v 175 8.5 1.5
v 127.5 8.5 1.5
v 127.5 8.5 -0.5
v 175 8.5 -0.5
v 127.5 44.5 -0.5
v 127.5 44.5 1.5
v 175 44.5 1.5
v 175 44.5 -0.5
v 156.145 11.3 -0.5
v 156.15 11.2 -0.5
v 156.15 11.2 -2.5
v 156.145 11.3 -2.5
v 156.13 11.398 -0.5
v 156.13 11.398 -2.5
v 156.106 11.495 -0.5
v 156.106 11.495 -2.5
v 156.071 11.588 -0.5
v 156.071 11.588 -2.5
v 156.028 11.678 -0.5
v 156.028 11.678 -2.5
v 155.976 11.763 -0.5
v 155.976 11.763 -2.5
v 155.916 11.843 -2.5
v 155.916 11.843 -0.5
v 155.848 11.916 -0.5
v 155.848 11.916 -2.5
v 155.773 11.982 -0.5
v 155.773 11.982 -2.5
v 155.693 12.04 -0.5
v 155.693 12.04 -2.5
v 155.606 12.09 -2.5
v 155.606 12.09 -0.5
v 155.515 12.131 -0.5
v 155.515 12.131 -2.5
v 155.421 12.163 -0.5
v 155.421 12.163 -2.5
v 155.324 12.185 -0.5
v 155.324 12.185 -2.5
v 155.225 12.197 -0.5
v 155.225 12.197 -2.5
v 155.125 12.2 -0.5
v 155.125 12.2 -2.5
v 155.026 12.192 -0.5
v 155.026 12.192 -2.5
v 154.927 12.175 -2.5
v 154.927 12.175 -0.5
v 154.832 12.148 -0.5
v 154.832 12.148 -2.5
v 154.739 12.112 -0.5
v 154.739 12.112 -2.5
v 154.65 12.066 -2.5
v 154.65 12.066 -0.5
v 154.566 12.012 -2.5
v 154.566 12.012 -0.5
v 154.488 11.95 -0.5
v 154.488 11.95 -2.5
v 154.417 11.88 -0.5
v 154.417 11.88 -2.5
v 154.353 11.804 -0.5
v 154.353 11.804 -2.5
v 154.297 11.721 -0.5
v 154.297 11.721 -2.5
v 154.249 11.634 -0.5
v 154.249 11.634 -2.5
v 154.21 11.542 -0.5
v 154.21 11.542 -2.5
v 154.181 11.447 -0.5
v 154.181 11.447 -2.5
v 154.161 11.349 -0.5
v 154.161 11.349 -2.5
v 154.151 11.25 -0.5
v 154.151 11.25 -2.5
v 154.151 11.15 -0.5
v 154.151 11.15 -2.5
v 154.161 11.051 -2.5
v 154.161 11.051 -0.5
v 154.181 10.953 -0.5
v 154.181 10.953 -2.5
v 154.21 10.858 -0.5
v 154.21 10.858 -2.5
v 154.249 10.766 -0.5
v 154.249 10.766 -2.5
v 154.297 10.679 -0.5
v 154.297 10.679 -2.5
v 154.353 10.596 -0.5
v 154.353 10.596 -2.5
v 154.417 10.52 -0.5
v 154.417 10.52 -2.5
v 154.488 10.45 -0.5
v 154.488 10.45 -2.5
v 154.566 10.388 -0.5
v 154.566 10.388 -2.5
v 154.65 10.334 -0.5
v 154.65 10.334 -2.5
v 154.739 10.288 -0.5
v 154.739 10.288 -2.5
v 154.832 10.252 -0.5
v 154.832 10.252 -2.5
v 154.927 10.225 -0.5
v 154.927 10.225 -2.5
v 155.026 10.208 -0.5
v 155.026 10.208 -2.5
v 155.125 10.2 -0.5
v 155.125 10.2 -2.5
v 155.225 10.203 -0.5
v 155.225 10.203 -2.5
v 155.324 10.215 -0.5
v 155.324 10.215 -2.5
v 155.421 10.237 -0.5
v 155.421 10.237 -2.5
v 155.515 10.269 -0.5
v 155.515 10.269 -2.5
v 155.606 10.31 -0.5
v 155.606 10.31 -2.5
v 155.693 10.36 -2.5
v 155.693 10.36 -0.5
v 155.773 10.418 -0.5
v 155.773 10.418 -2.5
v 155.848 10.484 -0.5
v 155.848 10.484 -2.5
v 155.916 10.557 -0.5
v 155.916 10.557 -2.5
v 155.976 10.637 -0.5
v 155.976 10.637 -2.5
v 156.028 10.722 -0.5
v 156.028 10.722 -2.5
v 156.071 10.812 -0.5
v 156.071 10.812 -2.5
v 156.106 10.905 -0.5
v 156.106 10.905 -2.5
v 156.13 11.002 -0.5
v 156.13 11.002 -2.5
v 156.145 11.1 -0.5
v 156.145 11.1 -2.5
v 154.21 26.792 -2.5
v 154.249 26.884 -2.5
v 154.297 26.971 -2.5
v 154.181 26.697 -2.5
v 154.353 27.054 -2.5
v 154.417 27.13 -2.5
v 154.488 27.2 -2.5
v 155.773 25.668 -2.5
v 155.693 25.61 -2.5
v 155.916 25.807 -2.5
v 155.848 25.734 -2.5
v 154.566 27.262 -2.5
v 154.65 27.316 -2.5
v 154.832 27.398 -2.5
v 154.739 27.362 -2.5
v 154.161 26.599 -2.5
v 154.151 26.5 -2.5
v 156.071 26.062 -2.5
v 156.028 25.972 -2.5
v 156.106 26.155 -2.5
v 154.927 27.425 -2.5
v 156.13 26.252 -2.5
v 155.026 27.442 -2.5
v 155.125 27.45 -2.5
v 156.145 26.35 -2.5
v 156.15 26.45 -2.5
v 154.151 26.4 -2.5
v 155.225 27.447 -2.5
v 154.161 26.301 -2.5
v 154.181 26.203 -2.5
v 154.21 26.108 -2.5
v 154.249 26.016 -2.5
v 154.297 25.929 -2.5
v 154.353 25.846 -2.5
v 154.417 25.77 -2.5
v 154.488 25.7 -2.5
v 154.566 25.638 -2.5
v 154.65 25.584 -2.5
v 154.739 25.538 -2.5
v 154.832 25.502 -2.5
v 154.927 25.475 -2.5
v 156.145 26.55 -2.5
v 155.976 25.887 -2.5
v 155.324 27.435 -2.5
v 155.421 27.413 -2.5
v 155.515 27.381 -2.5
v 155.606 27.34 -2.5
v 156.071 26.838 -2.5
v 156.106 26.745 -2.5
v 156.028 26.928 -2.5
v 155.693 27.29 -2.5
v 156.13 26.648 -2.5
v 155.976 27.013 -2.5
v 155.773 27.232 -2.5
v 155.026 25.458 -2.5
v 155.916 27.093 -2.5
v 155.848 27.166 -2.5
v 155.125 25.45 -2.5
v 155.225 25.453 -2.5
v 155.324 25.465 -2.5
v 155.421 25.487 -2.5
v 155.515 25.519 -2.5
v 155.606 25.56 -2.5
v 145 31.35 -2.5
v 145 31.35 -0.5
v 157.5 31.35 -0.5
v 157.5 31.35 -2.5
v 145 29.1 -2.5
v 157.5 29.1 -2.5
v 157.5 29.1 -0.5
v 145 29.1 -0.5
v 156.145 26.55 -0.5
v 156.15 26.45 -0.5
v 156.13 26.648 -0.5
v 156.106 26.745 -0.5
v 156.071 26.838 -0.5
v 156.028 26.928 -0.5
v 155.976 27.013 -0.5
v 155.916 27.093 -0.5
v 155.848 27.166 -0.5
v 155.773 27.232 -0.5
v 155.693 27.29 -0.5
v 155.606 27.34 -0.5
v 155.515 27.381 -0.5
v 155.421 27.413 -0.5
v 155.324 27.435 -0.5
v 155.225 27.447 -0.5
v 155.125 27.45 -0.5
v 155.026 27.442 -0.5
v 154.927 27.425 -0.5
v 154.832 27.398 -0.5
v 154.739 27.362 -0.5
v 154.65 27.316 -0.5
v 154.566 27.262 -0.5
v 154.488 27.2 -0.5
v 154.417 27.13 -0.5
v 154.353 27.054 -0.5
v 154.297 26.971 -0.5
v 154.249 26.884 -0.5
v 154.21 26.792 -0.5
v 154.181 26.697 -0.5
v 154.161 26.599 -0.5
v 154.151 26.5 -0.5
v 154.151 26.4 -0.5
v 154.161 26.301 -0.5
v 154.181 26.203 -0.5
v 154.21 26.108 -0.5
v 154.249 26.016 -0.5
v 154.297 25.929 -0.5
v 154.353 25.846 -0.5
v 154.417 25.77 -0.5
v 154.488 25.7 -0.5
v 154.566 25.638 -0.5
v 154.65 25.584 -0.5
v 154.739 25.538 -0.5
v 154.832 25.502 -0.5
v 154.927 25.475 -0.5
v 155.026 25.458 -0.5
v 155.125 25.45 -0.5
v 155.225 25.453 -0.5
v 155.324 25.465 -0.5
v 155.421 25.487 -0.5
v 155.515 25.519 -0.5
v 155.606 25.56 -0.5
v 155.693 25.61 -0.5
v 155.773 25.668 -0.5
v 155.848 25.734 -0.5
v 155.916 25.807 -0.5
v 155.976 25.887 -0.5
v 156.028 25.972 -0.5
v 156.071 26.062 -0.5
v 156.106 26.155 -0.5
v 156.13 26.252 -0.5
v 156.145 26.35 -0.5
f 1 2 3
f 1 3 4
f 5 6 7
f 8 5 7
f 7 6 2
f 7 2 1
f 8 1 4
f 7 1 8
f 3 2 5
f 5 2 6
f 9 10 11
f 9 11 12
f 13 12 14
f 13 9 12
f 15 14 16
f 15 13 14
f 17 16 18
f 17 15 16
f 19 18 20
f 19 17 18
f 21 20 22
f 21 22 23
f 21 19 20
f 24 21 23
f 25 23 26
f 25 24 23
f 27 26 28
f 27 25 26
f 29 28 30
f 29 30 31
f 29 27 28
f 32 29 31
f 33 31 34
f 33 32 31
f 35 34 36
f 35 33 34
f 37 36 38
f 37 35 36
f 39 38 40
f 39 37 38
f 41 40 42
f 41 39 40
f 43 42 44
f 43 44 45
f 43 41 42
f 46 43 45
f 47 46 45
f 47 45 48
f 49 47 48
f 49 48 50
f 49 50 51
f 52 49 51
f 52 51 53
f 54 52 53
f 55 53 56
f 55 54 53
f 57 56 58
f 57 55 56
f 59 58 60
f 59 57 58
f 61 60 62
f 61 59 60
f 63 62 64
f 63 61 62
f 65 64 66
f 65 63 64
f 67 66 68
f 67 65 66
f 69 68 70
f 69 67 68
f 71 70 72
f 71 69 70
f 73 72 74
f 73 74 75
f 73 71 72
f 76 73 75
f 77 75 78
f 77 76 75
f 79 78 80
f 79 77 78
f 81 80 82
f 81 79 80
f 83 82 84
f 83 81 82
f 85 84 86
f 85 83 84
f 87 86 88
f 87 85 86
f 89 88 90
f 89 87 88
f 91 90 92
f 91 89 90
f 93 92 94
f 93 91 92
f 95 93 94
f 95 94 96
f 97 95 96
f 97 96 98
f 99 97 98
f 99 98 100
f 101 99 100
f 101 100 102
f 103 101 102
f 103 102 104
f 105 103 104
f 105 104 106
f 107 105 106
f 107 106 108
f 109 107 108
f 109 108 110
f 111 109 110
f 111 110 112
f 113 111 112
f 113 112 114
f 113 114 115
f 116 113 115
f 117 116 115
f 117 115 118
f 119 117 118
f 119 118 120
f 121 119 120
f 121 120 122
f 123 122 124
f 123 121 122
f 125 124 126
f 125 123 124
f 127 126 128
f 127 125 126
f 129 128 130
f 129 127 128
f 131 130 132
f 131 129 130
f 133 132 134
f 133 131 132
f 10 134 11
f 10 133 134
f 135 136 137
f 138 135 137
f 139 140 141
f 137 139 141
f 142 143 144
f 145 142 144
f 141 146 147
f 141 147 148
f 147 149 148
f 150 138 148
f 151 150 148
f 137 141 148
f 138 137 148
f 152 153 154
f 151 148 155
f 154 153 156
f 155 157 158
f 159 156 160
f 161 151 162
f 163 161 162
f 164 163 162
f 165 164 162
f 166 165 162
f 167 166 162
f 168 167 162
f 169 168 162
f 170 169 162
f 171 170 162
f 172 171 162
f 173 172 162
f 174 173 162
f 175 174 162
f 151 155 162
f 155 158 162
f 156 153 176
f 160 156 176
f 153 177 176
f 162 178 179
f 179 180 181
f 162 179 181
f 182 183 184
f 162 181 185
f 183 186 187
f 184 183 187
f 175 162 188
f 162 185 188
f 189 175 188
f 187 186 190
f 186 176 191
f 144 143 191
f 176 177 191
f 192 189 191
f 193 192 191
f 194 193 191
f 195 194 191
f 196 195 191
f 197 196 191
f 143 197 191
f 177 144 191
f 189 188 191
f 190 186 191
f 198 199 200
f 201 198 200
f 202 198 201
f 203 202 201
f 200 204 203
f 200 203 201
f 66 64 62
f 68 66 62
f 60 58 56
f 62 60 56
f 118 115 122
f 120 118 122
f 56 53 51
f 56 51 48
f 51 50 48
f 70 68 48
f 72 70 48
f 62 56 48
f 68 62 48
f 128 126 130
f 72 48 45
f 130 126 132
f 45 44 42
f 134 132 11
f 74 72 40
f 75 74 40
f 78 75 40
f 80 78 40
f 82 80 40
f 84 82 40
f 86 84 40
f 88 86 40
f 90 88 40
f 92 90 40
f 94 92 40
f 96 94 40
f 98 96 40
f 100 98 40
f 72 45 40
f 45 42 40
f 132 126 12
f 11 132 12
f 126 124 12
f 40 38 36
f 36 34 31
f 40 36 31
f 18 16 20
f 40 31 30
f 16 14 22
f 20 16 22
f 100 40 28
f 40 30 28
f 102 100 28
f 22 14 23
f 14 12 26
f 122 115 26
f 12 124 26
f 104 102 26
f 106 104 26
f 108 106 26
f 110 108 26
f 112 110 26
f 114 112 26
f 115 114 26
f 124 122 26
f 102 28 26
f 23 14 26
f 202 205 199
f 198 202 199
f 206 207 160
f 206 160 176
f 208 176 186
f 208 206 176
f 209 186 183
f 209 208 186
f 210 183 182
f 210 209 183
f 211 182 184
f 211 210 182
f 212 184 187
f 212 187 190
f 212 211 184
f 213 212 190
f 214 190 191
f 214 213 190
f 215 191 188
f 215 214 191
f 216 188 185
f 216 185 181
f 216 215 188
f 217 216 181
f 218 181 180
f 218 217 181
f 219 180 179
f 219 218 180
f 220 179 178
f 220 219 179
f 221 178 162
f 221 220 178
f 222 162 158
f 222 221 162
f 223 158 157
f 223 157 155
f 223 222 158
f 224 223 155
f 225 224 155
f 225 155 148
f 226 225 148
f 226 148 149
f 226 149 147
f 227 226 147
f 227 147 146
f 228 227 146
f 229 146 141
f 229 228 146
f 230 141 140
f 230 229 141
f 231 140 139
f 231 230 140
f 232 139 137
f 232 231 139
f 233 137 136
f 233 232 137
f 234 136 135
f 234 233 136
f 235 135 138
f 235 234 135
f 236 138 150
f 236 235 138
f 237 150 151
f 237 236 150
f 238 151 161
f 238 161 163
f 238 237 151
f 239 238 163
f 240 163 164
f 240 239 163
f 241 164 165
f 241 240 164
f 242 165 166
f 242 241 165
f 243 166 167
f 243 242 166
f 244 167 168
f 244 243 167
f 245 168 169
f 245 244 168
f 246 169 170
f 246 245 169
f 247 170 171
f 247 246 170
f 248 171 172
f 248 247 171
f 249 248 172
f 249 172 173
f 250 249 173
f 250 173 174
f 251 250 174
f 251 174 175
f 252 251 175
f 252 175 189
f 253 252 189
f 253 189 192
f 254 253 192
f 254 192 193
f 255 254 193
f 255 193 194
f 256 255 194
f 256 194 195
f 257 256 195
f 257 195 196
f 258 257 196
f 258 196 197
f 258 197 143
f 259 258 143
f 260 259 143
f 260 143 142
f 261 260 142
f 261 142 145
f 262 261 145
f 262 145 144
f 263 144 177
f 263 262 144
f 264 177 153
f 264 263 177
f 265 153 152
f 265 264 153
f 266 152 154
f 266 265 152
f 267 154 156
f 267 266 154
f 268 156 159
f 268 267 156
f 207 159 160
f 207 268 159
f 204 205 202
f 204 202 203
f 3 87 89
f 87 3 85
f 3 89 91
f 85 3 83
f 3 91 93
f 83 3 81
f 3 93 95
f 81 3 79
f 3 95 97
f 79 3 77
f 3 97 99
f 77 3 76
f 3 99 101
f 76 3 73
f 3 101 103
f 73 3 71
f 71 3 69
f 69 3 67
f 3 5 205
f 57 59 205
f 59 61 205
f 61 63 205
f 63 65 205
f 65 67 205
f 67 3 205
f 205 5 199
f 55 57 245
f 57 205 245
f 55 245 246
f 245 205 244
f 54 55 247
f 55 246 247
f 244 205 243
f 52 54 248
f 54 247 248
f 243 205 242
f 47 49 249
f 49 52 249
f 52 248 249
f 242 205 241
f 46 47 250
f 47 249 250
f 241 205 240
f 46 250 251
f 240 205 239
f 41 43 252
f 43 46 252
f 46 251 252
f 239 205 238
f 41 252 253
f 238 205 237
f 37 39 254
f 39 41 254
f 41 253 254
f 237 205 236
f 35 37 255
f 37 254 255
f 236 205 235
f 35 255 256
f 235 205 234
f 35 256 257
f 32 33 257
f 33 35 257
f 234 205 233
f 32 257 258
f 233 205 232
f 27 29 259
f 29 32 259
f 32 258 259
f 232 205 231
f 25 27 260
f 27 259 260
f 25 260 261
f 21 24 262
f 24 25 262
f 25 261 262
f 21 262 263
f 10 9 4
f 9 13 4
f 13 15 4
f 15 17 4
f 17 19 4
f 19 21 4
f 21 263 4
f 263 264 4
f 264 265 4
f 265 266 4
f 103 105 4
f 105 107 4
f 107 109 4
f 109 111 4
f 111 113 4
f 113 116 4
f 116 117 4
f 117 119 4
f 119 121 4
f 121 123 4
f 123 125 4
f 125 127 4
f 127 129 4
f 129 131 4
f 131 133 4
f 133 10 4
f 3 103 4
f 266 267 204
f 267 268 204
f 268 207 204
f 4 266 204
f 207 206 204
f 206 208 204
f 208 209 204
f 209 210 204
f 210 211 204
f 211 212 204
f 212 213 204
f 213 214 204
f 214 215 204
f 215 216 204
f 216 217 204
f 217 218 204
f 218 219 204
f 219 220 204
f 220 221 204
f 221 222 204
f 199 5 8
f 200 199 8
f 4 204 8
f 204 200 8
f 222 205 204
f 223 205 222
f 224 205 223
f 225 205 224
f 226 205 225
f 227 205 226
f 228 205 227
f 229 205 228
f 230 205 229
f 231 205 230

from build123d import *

# Parameters (mm, degrees)
SKETCH034_R      = 1
SKETCH034_W      = 12.5
SKETCH034_H      = 2.25
EXTRUDE032_DEPTH = 2
SKETCH033_W      = 47.5
SKETCH033_H      = 36
EXTRUDE031_DEPTH = 2


with BuildPart() as extrude032:
    # Sketch034 → Extrude032 (new body)
    with BuildSketch(Plane.XY.offset(-0.5)):
        with Locations((155.15, 11.2)):
            Circle(SKETCH034_R)
        with Locations((155.15, 26.45)):
            Circle(SKETCH034_R)
        with Locations((151.25, 30.225)):
            Rectangle(SKETCH034_W, SKETCH034_H)
    extrude(amount=-EXTRUDE032_DEPTH)


with BuildPart() as sensorsheet:
    # Sketch033 → Extrude031 (new body)
    with BuildSketch(Plane.XY.offset(1.5)):
        with Locations((151.25, 26.5)):
            Rectangle(SKETCH033_W, SKETCH033_H)
    extrude(amount=-EXTRUDE031_DEPTH)

    # Fusion009: union Extrude032
    add(extrude032.part)


solid = sensorsheet.part
